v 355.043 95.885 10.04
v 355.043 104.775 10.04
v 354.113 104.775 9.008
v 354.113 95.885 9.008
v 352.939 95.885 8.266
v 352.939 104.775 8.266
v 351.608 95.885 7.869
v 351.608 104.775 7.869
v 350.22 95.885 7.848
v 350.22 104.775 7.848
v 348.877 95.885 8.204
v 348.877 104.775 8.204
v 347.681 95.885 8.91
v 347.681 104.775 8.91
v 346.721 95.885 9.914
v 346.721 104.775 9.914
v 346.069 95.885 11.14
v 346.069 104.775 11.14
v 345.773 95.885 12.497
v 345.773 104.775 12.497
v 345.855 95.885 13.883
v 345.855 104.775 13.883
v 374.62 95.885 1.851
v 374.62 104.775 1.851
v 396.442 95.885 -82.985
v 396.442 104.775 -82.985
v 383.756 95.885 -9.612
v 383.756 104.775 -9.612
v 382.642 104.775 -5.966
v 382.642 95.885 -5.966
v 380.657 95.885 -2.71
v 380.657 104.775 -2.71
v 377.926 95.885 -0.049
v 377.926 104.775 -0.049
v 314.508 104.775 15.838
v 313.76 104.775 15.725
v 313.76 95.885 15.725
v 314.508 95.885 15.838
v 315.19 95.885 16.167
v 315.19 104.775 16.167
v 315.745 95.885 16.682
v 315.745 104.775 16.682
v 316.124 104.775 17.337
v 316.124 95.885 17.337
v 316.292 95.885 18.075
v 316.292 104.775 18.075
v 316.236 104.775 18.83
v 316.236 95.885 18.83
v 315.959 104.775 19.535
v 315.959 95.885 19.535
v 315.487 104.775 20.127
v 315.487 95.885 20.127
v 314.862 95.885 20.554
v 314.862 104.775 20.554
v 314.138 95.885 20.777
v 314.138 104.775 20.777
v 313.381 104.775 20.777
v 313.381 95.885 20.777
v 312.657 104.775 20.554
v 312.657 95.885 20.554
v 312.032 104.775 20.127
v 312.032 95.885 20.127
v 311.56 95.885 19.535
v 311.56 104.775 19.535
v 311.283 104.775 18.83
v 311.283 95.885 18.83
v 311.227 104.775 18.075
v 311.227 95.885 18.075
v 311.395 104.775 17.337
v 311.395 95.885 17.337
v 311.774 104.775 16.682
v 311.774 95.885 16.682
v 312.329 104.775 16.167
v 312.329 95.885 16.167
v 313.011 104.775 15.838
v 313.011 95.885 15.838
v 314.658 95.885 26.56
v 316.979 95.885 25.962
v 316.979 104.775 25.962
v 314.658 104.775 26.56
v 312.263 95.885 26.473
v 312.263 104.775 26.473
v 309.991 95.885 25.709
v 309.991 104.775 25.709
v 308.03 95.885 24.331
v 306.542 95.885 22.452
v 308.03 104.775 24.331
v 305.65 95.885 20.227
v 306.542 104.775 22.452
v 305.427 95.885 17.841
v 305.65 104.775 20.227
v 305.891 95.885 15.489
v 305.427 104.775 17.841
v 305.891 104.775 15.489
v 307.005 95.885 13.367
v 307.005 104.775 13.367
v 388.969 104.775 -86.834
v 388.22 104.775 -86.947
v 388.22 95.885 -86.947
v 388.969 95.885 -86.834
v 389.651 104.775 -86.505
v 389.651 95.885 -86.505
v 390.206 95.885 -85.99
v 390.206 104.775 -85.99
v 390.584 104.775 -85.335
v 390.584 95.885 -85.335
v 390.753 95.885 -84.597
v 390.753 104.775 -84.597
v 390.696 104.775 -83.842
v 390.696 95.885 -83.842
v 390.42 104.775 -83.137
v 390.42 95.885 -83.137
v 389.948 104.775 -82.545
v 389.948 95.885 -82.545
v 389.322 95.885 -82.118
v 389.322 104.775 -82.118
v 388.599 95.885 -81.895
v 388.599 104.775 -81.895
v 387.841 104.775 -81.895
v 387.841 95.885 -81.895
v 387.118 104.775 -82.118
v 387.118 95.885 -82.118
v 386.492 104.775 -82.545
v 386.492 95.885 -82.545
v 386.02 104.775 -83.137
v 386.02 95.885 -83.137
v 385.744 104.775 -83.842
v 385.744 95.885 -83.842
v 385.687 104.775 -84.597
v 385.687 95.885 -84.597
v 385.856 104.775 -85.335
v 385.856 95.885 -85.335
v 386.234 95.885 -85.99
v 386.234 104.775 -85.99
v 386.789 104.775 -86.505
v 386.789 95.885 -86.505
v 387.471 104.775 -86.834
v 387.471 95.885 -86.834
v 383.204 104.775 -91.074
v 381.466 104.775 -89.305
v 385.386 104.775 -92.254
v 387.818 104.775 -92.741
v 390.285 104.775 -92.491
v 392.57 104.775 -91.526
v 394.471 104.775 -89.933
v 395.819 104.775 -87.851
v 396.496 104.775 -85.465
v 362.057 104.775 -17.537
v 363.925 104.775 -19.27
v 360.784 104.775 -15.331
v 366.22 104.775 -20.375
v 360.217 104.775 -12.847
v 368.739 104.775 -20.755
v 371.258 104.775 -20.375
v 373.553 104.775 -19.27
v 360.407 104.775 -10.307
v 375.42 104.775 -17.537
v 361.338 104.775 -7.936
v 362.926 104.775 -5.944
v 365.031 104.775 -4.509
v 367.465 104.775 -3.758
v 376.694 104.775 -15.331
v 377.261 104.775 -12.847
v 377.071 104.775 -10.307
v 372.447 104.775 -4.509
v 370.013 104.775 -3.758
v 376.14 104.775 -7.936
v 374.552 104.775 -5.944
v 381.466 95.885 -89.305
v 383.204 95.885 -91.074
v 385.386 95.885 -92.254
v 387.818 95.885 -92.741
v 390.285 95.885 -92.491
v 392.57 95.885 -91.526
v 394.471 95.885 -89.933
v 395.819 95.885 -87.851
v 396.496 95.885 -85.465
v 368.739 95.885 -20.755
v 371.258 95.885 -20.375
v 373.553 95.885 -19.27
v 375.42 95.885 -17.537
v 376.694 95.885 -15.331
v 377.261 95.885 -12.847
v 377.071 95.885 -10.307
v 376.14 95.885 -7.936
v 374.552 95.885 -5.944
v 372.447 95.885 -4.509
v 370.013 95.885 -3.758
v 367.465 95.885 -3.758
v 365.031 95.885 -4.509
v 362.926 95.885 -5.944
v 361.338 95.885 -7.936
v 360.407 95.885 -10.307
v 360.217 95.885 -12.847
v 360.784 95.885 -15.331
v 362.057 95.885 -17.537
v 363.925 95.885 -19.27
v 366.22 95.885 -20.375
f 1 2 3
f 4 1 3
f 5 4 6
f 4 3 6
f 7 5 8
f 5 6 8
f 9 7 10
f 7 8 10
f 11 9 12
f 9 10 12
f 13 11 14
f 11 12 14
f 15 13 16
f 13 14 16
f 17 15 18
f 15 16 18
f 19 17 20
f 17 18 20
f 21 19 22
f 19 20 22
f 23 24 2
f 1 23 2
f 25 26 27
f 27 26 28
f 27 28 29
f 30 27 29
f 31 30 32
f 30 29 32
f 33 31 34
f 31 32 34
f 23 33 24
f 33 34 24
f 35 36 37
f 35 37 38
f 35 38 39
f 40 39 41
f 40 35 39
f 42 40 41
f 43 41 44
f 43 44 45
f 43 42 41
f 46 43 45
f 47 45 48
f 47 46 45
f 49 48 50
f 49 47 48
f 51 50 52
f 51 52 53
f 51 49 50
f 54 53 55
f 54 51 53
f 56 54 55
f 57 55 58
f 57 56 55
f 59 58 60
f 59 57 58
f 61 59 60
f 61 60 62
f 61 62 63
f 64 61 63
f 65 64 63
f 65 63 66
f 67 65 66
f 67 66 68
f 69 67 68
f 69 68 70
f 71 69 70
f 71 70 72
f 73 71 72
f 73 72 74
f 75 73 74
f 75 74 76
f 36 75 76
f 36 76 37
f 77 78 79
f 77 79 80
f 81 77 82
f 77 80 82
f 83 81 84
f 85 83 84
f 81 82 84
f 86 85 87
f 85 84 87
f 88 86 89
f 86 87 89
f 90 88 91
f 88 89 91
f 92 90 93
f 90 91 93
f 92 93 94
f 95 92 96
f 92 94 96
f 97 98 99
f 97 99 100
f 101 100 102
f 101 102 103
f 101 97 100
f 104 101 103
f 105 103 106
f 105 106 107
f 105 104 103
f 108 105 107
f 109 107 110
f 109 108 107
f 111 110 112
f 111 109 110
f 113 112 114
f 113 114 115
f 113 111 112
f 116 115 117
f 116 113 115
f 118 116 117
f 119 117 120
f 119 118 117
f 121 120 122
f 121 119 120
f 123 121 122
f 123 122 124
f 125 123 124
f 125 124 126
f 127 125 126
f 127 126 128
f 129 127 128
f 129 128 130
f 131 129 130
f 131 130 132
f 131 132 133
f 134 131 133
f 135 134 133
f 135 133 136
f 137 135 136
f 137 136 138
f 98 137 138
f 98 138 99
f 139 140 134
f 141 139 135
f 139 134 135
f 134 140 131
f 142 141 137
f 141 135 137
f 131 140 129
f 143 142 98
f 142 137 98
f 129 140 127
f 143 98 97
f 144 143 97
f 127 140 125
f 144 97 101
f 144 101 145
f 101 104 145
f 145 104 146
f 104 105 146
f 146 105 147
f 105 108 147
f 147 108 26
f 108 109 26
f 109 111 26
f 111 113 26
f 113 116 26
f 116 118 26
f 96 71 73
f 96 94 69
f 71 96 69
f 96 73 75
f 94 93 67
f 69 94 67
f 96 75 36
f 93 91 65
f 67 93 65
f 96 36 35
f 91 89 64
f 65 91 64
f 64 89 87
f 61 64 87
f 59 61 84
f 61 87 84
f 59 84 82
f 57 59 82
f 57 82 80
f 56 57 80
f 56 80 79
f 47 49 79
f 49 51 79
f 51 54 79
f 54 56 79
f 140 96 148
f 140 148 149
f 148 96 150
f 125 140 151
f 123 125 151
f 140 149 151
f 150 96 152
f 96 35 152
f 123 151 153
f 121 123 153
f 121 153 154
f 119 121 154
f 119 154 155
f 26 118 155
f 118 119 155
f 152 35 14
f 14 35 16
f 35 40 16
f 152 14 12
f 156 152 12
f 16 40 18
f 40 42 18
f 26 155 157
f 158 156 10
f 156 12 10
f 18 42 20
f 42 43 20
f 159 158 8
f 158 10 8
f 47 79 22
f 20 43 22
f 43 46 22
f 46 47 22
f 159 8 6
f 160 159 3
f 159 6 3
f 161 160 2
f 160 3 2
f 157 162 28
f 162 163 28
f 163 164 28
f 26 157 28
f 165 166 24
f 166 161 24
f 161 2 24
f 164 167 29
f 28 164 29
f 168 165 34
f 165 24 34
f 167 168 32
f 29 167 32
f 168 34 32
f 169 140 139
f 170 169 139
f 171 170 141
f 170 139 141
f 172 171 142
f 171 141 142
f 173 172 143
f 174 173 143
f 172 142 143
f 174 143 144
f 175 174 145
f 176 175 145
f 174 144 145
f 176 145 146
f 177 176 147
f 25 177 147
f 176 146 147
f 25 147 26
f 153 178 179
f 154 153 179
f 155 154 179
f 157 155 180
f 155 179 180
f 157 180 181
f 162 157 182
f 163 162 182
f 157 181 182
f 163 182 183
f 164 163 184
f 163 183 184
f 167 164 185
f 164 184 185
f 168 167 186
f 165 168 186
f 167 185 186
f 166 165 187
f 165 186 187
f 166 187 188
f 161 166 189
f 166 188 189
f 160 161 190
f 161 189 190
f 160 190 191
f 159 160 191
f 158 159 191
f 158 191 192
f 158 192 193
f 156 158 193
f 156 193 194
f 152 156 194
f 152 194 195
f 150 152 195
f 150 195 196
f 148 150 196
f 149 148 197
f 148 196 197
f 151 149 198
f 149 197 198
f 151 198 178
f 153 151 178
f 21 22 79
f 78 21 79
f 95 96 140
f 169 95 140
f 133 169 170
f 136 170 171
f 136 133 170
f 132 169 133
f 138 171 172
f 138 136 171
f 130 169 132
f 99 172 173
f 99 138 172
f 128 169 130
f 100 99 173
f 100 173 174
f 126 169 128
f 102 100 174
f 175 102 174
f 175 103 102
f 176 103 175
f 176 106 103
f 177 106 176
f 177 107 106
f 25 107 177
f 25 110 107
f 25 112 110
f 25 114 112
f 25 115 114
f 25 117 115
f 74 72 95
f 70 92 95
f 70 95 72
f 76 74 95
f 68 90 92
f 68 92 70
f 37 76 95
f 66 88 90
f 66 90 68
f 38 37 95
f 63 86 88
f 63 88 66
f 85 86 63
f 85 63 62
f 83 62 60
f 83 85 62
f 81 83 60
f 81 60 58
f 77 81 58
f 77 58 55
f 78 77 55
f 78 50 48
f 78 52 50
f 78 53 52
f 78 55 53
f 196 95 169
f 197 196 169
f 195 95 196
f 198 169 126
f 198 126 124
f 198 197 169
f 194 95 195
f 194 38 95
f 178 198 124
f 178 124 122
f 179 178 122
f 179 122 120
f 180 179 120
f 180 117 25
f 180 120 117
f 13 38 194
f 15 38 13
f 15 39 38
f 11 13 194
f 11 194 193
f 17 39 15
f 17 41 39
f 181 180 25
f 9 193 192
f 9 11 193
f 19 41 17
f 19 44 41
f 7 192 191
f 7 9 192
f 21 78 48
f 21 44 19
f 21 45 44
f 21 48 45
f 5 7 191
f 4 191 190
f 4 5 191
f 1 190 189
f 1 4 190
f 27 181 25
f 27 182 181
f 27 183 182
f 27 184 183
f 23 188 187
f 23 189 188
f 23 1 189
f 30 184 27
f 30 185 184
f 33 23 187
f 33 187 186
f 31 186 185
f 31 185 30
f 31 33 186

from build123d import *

# Parameters (mm, degrees)
SKETCH1_W                  = 355.6
SKETCH1_H                  = 77.724
BOSS_EXTRUDE1_DEPTH        = 22.225
SKETCH2_W                  = 74.549
SKETCH2_H                  = 19.05
CUT_EXTRUDE1_DEPTH         = 364.67400769
SKETCH3_W                  = 25.4
SKETCH3_H                  = 3.937
CUT_EXTRUDE2_DEPTH         = 817.444922817
SKETCH4_W                  = 330.2
SKETCH4_H                  = 3.175
BOSS_EXTRUDE2_DEPTH        = 15.875
SKETCH5_W                  = 69.85
SKETCH5_H                  = 3.175
BOSS_EXTRUDE3_DEPTH        = 457.2
SKETCH6_W                  = 330.2
SKETCH6_H                  = 3.175
BOSS_EXTRUDE4_DEPTH        = 3.937
SKETCH7_W                  = 330.2
SKETCH7_H                  = 3.175
BOSS_EXTRUDE5_DEPTH        = 15.875
SKETCH8_W                  = 355.6
SKETCH8_H                  = 3.175
BOSS_EXTRUDE6_DEPTH        = 3.937
SKETCH9_W                  = 355.6
SKETCH9_H                  = 3.175
BOSS_EXTRUDE7_DEPTH        = 19.05
SKETCH10_W                 = 76.358809824
SKETCH10_H                 = 3.175
BOSS_EXTRUDE8_DEPTH        = 27.432
SKETCH11_W                 = 124.052954744
SKETCH11_H                 = 3.175
BOSS_EXTRUDE9_DEPTH        = 19.05
DRAFT1_ANGLE               = 30
DRAFT2_ANGLE               = 19
M20_CLEARANCE_HOLE1_D      = 22.225
M20_CLEARANCE_HOLE1_DEPTH  = 19.050025
HOLE1_D                    = 8.128
HOLE1_DEPTH                = 22.225
M25_CLEARANCE_HOLE1_D      = 28.575
M25_CLEARANCE_HOLE1_DEPTH  = 22.225
M3_CLEARANCE_HOLE1_D       = 3.571875
M3_CLEARANCE_HOLE1_DEPTH   = 22.225
M2_CLEARANCE_HOLE1_D       = 2.54
M2_CLEARANCE_HOLE1_DEPTH   = 22.225
M3_5_CLEARANCE_HOLE1_D     = 4.064
M3_5_CLEARANCE_HOLE1_DEPTH = 22.225
HOLE2_D                    = 5.08
HOLE2_DEPTH                = 22.225
M25_CLEARANCE_HOLE2_D      = 28.575
M25_CLEARANCE_HOLE2_DEPTH  = 19.050025
HOLE3_D                    = 5.1054
HOLE3_DEPTH                = 19.050025
HOLE4_D                    = 8.128
HOLE4_DEPTH                = 19.050025
M3_CLEARANCE_HOLE2_D       = 3.571875
M3_CLEARANCE_HOLE2_DEPTH   = 19.050025
M6_CLEARANCE_HOLE1_D       = 6.7056
M6_CLEARANCE_HOLE1_DEPTH   = 22.225
M6_CLEARANCE_HOLE2_D       = 6.7056
M6_CLEARANCE_HOLE2_DEPTH   = 101.219
M5_CLEARANCE_HOLE1_D       = 5.334
M5_CLEARANCE_HOLE1_DEPTH   = 92.837
CHAMFER1_SIZE              = 3.175
FILLET1_R                  = 0.762
FILLET2_R                  = 3.175
FILLET3_R                  = 3.937
CUT_EXTRUDE3_DEPTH         = 819.902667079
CUT_EXTRUDE3_DEPTH_BACK    = 819.902667079
BOSS_EXTRUDE10_START       = -3.175
SKETCH45_W                 = 177.8
SKETCH45_H                 = 304.8
SKETCH45_R                 = 2.54
SKETCH45_R_2               = 14.2875
SKETCH45_R_3               = 2.032
SKETCH45_R_4               = 3.3528
BOSS_EXTRUDE10_DEPTH       = 3.175
SKETCH61_R                 = 9.652
SKETCH61_R_2               = 14.351
CUT_EXTRUDE16_DEPTH        = 556.389125447
SKETCH59_R                 = 9.5
CUT_EXTRUDE17_DEPTH        = 556.389125447
SKETCH62_R                 = 3.175
CUT_EXTRUDE18_DEPTH        = 556.389125447
CUT_EXTRUDE19_DEPTH        = 556.389125447
SKETCH70_R                 = 9.5
SKETCH70_R_2               = 8.5
BOSS_EXTRUDE15_DEPTH       = 3.175
SKETCH73_R                 = 2.54
CUT_EXTRUDE21_DEPTH        = 556.389125447
FILLET9_R                  = 25.4
BOSS_EXTRUDE17_START       = 101.6
SKETCH74_R                 = 2.54
SKETCH74_R_2               = 14.351
SKETCH74_R_3               = 9.5
SKETCH74_R_4               = 6.35
BOSS_EXTRUDE17_DEPTH       = 3.175
SKETCH75_W                 = 279.499497025
SKETCH75_H                 = 356.937981548
CUT_EXTRUDE22_DEPTH        = 566.17678709
SKETCH93_R                 = 2.54
CUT_EXTRUDE32_DEPTH        = 526.348222626
SKETCH98_R                 = 9.6
SKETCH98_R_2               = 2.54
BOSS_EXTRUDE23_DEPTH       = 8.89
SKETCH99_W                 = 685.374390259
SKETCH99_H                 = 496.181227768
CUT_EXTRUDE37_DEPTH        = 526.413843071
SKETCH100_R                = 9.6
SKETCH100_R_2              = 8.54600018
BOSS_EXTRUDE24_DEPTH       = 8.89


with BuildPart() as part:
    # Sketch1 → Boss-Extrude1 (new body)
    with BuildSketch(Plane(origin=(0, 3.175, 0), x_dir=(1, 0, 0), z_dir=(0, 1, 0))):
        with Locations((635, 34.925)):
            Rectangle(SKETCH1_W, SKETCH1_H)
    extrude(amount=-BOSS_EXTRUDE1_DEPTH)

    # Sketch2 → Cut-Extrude1 (cut, through all)
    with BuildSketch(Plane(origin=(812.8, 0, 0), x_dir=(0, 0, -1), z_dir=(1, 0, 0))):
        with Locations((33.3375, -9.525)):
            Rectangle(SKETCH2_W, SKETCH2_H)
    extrude(amount=-CUT_EXTRUDE1_DEPTH, mode=Mode.SUBTRACT)

    # Sketch3 → Cut-Extrude2 (cut, through all)
    with BuildSketch(Plane(origin=(0, 3.175, 0), x_dir=(-1, 0, 0), z_dir=(0, 1, 0))):
        with Locations((-469.9, 1.9685)):
            Rectangle(SKETCH3_W, SKETCH3_H)
    extrude(amount=-CUT_EXTRUDE2_DEPTH, mode=Mode.SUBTRACT)

    # Sketch4 → Boss-Extrude2 (add)
    with BuildSketch(Plane(origin=(0, 3.175, 0), x_dir=(-1, 0, 0), z_dir=(0, 1, 0))):
        with Locations((-647.7, 2.3495)):
            Rectangle(SKETCH4_W, SKETCH4_H)
    extrude(amount=BOSS_EXTRUDE2_DEPTH)

    # Sketch5 → Boss-Extrude3 (add)
    with BuildSketch(Plane.ZY.offset(-457.2)):
        with Locations((-34.925, 1.5875)):
            Rectangle(SKETCH5_W, SKETCH5_H)
    extrude(amount=BOSS_EXTRUDE3_DEPTH)

    # Sketch6 → Boss-Extrude4 (add)
    with BuildSketch(Plane.XY):
        with Locations((165.1, 1.5875)):
            Rectangle(SKETCH6_W, SKETCH6_H)
    extrude(amount=BOSS_EXTRUDE4_DEPTH)

    # Sketch7 → Boss-Extrude5 (add)
    with BuildSketch(Plane(origin=(0, 3.175, 0), x_dir=(-1, 0, 0), z_dir=(0, 1, 0))):
        with Locations((-165.1, 2.3495)):
            Rectangle(SKETCH7_W, SKETCH7_H)
    extrude(amount=BOSS_EXTRUDE5_DEPTH)

    # Sketch8 → Boss-Extrude6 (add)
    with BuildSketch(Plane(origin=(0, 0, -69.85), x_dir=(-1, 0, 0), z_dir=(0, 0, -1))):
        with Locations((-177.8, 1.5875)):
            Rectangle(SKETCH8_W, SKETCH8_H)
    extrude(amount=BOSS_EXTRUDE6_DEPTH)

    # Sketch9 → Boss-Extrude7 (add)
    with BuildSketch(Plane.XZ):
        with Locations((177.8, -72.1995)):
            Rectangle(SKETCH9_W, SKETCH9_H)
    extrude(amount=BOSS_EXTRUDE7_DEPTH)

    # Sketch10 → Boss-Extrude8 (add)
    with BuildSketch(Plane(origin=(0, 0, -69.85), x_dir=(-1, 0, 0), z_dir=(0, 0, -1))):
        with Locations((-406.4, 1.5875)):
            Rectangle(SKETCH10_W, SKETCH10_H)
    extrude(amount=BOSS_EXTRUDE8_DEPTH)

    # Sketch11 → Boss-Extrude9 (add)
    with BuildSketch(Plane.XY):
        with Locations((406.4, 1.5875)):
            Rectangle(SKETCH11_W, SKETCH11_H)
    extrude(amount=BOSS_EXTRUDE9_DEPTH)

    # Draft1
    draft1_faces = [part.faces().sort_by_distance(p)[0] for p in [
        (344.373522628, 1.5875, 9.525),
        (468.426477372, 1.5875, 9.525),
    ]]
    draft(draft1_faces, Plane.XY.offset(19.05), DRAFT1_ANGLE)

    # Draft2
    draft2_faces = [part.faces().sort_by_distance(p)[0] for p in [
        (368.220595088, 1.5875, -83.566),
        (444.579404912, 1.5875, -83.566),
    ]]
    draft(draft2_faces, Plane(origin=(0, 0, -97.282), x_dir=(-1, 0, 0), z_dir=(0, 0, -1)), DRAFT2_ANGLE)

    # M20 Clearance Hole1
    with Locations(Plane(origin=(0, 0, 0), x_dir=(-1, 0, 0), z_dir=(0, -1, 0))):
        with Locations((-624.254637168, 36.83)):
            Hole(M20_CLEARANCE_HOLE1_D / 2, depth=M20_CLEARANCE_HOLE1_DEPTH)

    # Hole1
    with Locations(Plane(origin=(0, 3.175, 0), x_dir=(1, 0, 0), z_dir=(0, 1, 0))):
        with Locations((229.261562832, 36.83), (229.261562832, 62.23), (229.261562832, 11.43)):
            Hole(HOLE1_D / 2, depth=HOLE1_DEPTH)

    # M25 Clearance Hole1
    with Locations(Plane(origin=(0, 3.175, 0), x_dir=(1, 0, 0), z_dir=(0, 1, 0))):
        with Locations((147.829162832, 36.83)):
            Hole(M25_CLEARANCE_HOLE1_D / 2, depth=M25_CLEARANCE_HOLE1_DEPTH)

    # M3 Clearance Hole1
    with Locations(Plane(origin=(0, 3.175, 0), x_dir=(1, 0, 0), z_dir=(0, 1, 0))):
        with Locations((120.600362832, 65.405), (120.600362832, 8.255), (237.440362832, 8.255), (237.440362832, 65.405)):
            Hole(M3_CLEARANCE_HOLE1_D / 2, depth=M3_CLEARANCE_HOLE1_DEPTH)

    # M2 Clearance Hole1
    with Locations(Plane(origin=(0, 3.175, 0), x_dir=(1, 0, 0), z_dir=(0, 1, 0))):
        with Locations((101.6, 3.175), (101.6, 66.675), (50.8, 66.675), (50.8, 3.175), (762, 66.675), (762, 3.175), (711.2, 3.175), (711.2, 66.675)):
            Hole(M2_CLEARANCE_HOLE1_D / 2, depth=M2_CLEARANCE_HOLE1_DEPTH)

    # M3.5 Clearance Hole1
    with Locations(Plane(origin=(0, 3.175, 0), x_dir=(1, 0, 0), z_dir=(0, 1, 0))):
        with Locations((443.992, 87.85352), (368.808, 87.85352), (361.9119, -1.03886), (450.8881, -1.03886)):
            Hole(M3_5_CLEARANCE_HOLE1_D / 2, depth=M3_5_CLEARANCE_HOLE1_DEPTH)

    # Hole2
    with Locations(Plane(origin=(0, 3.175, 0), x_dir=(1, 0, 0), z_dir=(0, 1, 0))):
        with Locations((438.15, 87.85352), (374.65, 87.85352), (445.0461, -1.03886), (367.7539, -1.03886), (115.520362832, 65.405), (115.520362832, 8.255), (242.520362832, 8.255), (242.520362832, 65.405)):
            Hole(HOLE2_D / 2, depth=HOLE2_DEPTH)

    # M25 Clearance Hole2
    with Locations(Plane(origin=(0, 0, 0), x_dir=(-1, 0, 0), z_dir=(0, -1, 0))):
        with Locations((-406.4, 17.272), (-664.970837168, 36.83)):
            Hole(M25_CLEARANCE_HOLE2_D / 2, depth=M25_CLEARANCE_HOLE2_DEPTH)

    # Hole3
    with Locations(Plane(origin=(0, 0, 0), x_dir=(-1, 0, 0), z_dir=(0, -1, 0))):
        with Locations((-570.279637168, 8.255), (-570.279637168, 65.405), (-697.279637168, 65.405), (-697.279637168, 8.255)):
            Hole(HOLE3_D / 2, depth=HOLE3_DEPTH)

    # Hole4
    with Locations(Plane(origin=(0, 0, 0), x_dir=(-1, 0, 0), z_dir=(0, -1, 0))):
        with Locations((-583.538437168, 11.43), (-583.538437168, 36.83), (-583.538437168, 62.23)):
            Hole(HOLE4_D / 2, depth=HOLE4_DEPTH)

    # M3 Clearance Hole2
    with Locations(Plane(origin=(0, 0, 0), x_dir=(-1, 0, 0), z_dir=(0, -1, 0))):
        with Locations((-692.199637168, 8.255), (-692.199637168, 65.405), (-575.359637168, 65.405), (-575.359637168, 8.255)):
            Hole(M3_CLEARANCE_HOLE2_D / 2, depth=M3_CLEARANCE_HOLE2_DEPTH)

    # M6 Clearance Hole1
    with Locations(Plane(origin=(0, 3.175, 0), x_dir=(1, 0, 0), z_dir=(0, 1, 0))):
        with Locations((612.775, 10.287), (498.475, 10.287), (314.325, 10.287), (200.025, 10.287), (628.319218584, 61.976), (184.480781416, 61.976), (690.88, 15.875), (739.902, 9.525), (121.92, 15.875), (72.898, 9.525), (298.874532383, 17.547282407), (513.925467617, 17.547282407), (165.1, 14.732), (266.7, 14.732), (546.1, 14.732), (647.7, 14.732), (330.2, 61.722), (279.4, 61.722), (139.7, 61.722), (25.4, 61.722), (482.6, 61.722), (533.4, 61.722), (673.1, 61.722), (787.4, 61.722), (6.35, 39.497), (806.45, 39.497), (350.8375, -12.8905), (461.9625, -12.8905)):
            Hole(M6_CLEARANCE_HOLE1_D / 2, depth=M6_CLEARANCE_HOLE1_DEPTH)

    # M6 Clearance Hole2
    with Locations(Plane.XY.offset(3.937)):
        with Locations((495.3, 12.7), (520.7, 12.7), (546.1, 12.7), (571.5, 12.7), (596.9, 12.7), (622.3, 12.7), (647.7, 12.7), (673.1, 12.7), (698.5, 12.7), (723.9, 12.7), (749.3, 12.7), (774.7, 12.7), (800.1, 12.7), (317.5, 12.7), (292.1, 12.7), (266.7, 12.7), (241.3, 12.7), (215.9, 12.7), (190.5, 12.7), (165.1, 12.7), (139.7, 12.7), (114.3, 12.7), (88.9, 12.7), (63.5, 12.7), (12.7, 12.7), (38.1, 12.7)):
            Hole(M6_CLEARANCE_HOLE2_D / 2, depth=M6_CLEARANCE_HOLE2_DEPTH)

    # M5 Clearance Hole1
    with Locations(Plane(origin=(0, 0, -73.787), x_dir=(-1, 0, 0), z_dir=(0, 0, -1))):
        with Locations((-469.9, -12.7), (-495.3, -12.7), (-520.7, -12.7), (-546.1, -12.7), (-571.5, -12.7), (-596.9, -12.7), (-622.3, -12.7), (-647.7, -12.7), (-673.1, -12.7), (-698.5, -12.7), (-723.9, -12.7), (-749.3, -12.7), (-774.7, -12.7), (-800.1, -12.7), (-342.9, -12.7), (-317.5, -12.7), (-292.1, -12.7), (-266.7, -12.7), (-241.3, -12.7), (-215.9, -12.7), (-190.5, -12.7), (-165.1, -12.7), (-139.7, -12.7), (-114.3, -12.7), (-88.9, -12.7), (-63.5, -12.7), (-38.1, -12.7), (-12.7, -12.7)):
            Hole(M5_CLEARANCE_HOLE1_D / 2, depth=M5_CLEARANCE_HOLE1_DEPTH)

    # Chamfer1
    chamfer1_edges = [part.edges().sort_by_distance(p)[0] for p in [
        (482.6, 19.05, 2.3495),
        (0, 19.05, 2.3495),
        (812.8, 19.05, 2.3495),
        (812.8, -19.05, -72.1995),
        (457.2, -19.05, -72.1995),
        (0, -19.05, -72.1995),
        (330.2, 19.05, 2.3495),
        (355.6, -19.05, -72.1995),
    ]]
    chamfer(chamfer1_edges, length=CHAMFER1_SIZE)

    # Fillet1
    fillet1_edges = [part.edges().sort_by_distance(p)[0] for p in [
        (647.7, 3.175, 0.762),
        (177.8, 0, -70.612),
        (635, 0, -70.612),
        (165.1, 3.175, 0.762),
    ]]
    fillet(fillet1_edges, radius=FILLET1_R)

    # Fillet2
    fillet2_edges = [part.edges().sort_by_distance(p)[0] for p in [
        (368.220595088, 1.5875, -97.282),
        (333.375, 1.5875, 0),
        (344.373522628, 1.5875, 19.05),
        (444.579404912, 1.5875, -97.282),
        (358.775, 1.5875, -69.85),
        (479.425, 1.5875, 0),
        (468.426477372, 1.5875, 19.05),
        (454.025, 1.5875, -69.85),
    ]]
    fillet(fillet2_edges, radius=FILLET2_R)

    # Fillet3
    fillet3_edges = [part.edges().sort_by_distance(p)[0] for p in [
        (165.1, 0, 3.937),
        (647.7, 0, 3.937),
        (635, 3.175, -73.787),
        (177.8, 3.175, -73.787),
    ]]
    fillet(fillet3_edges, radius=FILLET3_R)

    # Sketch44 → Cut-Extrude3 (cut, two sides: drawn at the far end of the back side and taken through both)
    with BuildSketch(Plane(origin=(0, 3.175, 0), x_dir=(1, 0, 0), z_dir=(0, 1, 0)).offset(-CUT_EXTRUDE3_DEPTH_BACK)):
        Polygon((367.483279101, 95.14067889), (343.456979076, -17.4625), (339.564298226, -35.70618453), (-19.786749283, -35.70618453), (-19.786749283, 120.609234526), (367.483279101, 120.609234526), align=None)
        Polygon((445.316720899, 95.14067889), (445.316720899, 120.609234526), (832.586749283, 120.609234526), (832.586749283, -35.70618453), (473.235701774, -35.70618453), (469.343020924, -17.4625), align=None)
    extrude(amount=CUT_EXTRUDE3_DEPTH + CUT_EXTRUDE3_DEPTH_BACK, mode=Mode.SUBTRACT)

    # Sketch45 → Boss-Extrude10 (add)
    with BuildSketch(Plane(origin=(0, 3.175, 0), x_dir=(1, 0, 0), z_dir=(0, 1, 0)).offset(BOSS_EXTRUDE10_START)):
        with Locations((392.1125, 125.222)):
            Rectangle(SKETCH45_W, SKETCH45_H)
        with Locations(Location((374.65, 87.85352, 0), (0, 0, 270))):
            Circle(SKETCH45_R, mode=Mode.SUBTRACT)
        with Locations(Location((406.4, 17.272, 0), (0, 0, 90))):
            Circle(SKETCH45_R_2, mode=Mode.SUBTRACT)
        with Locations(Location((368.808, 87.85352, 0), (0, 0, 270))):
            Circle(SKETCH45_R_3, mode=Mode.SUBTRACT)
        with Locations(Location((438.15, 87.85352, 0), (0, 0, 270))):
            Circle(SKETCH45_R, mode=Mode.SUBTRACT)
        with Locations(Location((443.992, 87.85352, 0), (0, 0, 270))):
            Circle(SKETCH45_R_3, mode=Mode.SUBTRACT)
        with Locations(Location((445.0461, -1.03886, 0), (0, 0, 270))):
            Circle(SKETCH45_R, mode=Mode.SUBTRACT)
        with Locations(Location((450.8881, -1.03886, 0), (0, 0, 270))):
            Circle(SKETCH45_R_3, mode=Mode.SUBTRACT)
        with Locations(Location((461.9625, -12.8905, 0), (0, 0, 270))):
            Circle(SKETCH45_R_4, mode=Mode.SUBTRACT)
        with Locations(Location((367.7539, -1.03886, 0), (0, 0, 270))):
            Circle(SKETCH45_R, mode=Mode.SUBTRACT)
        with Locations(Location((361.9119, -1.03886, 0), (0, 0, 270))):
            Circle(SKETCH45_R_3, mode=Mode.SUBTRACT)
        with Locations(Location((350.8375, -12.8905, 0), (0, 0, 270))):
            Circle(SKETCH45_R_4, mode=Mode.SUBTRACT)
    extrude(amount=BOSS_EXTRUDE10_DEPTH)

    # Sketch61 → Cut-Extrude16 (cut, through all)
    with BuildSketch(Plane(origin=(0, 3.175, 0), x_dir=(1, 0, 0), z_dir=(0, 1, 0))):
        with Locations(Location((354.59, 181.205026561, 0), (0, 0, 270))):
            Circle(SKETCH61_R)
        with Locations(Location((427.755496639, 227.083776561, 0), (0, 0, 270))):
            Circle(SKETCH61_R)
        with Locations(Location((427.755496639, 145.803776561, 0), (0, 0, 270))):
            Circle(SKETCH61_R_2)
    extrude(amount=-CUT_EXTRUDE16_DEPTH, mode=Mode.SUBTRACT)

    # Sketch59 → Cut-Extrude17 (cut, through all)
    with BuildSketch(Plane(origin=(0, 3.175, 0), x_dir=(1, 0, 0), z_dir=(0, 1, 0))):
        with Locations(Location((348.684503149, 23.009719341, 0), (0, 0, 270))):
            Circle(SKETCH59_R)
    extrude(amount=-CUT_EXTRUDE17_DEPTH, mode=Mode.SUBTRACT)

    # Sketch62 → Cut-Extrude18 (cut, through all)
    with BuildSketch(Plane(origin=(0, 3.175, 0), x_dir=(1, 0, 0), z_dir=(0, 1, 0))):
        with Locations(Location((354.59, 206.605026561, 0), (0, 0, 270))):
            Circle(SKETCH62_R)
        with Locations(Location((354.59, 155.805026561, 0), (0, 0, 270))):
            Circle(SKETCH62_R)
        with Locations(Location((402.355496639, 227.083776561, 0), (0, 0, 270))):
            Circle(SKETCH62_R)
        with Locations(Location((453.155496639, 227.083776561, 0), (0, 0, 270))):
            Circle(SKETCH62_R)
    extrude(amount=-CUT_EXTRUDE18_DEPTH, mode=Mode.SUBTRACT)

    # Sketch64 → Cut-Extrude19 (cut, through all)
    with BuildSketch(Plane(origin=(0, 3.175, 0), x_dir=(1, 0, 0), z_dir=(0, 1, 0))):
        with BuildLine():
            Line((303.2125, 150.622), (303.2125, 277.622))
            Line((303.2125, 277.622), (430.2125, 277.622))
            ThreePointArc((430.2125, 277.622), (340.409938789, 240.424561211), (303.2125, 150.622))
        make_face()
    extrude(amount=-CUT_EXTRUDE19_DEPTH, mode=Mode.SUBTRACT)

    # Sketch70 → Boss-Extrude15 (add)
    with BuildSketch(Plane(origin=(0, 3.175, 0), x_dir=(1, 0, 0), z_dir=(0, 1, 0))):
        with Locations((348.684503149, 23.009719341)):
            Circle(SKETCH70_R)
        with Locations(Location((348.684503149, 23.009719341, 0), (0, 0, 270))):
            Circle(SKETCH70_R_2, mode=Mode.SUBTRACT)
    extrude(amount=-BOSS_EXTRUDE15_DEPTH)

    # Sketch73 → Cut-Extrude21 (cut, through all)
    with BuildSketch(Plane(origin=(0, 3.175, 0), x_dir=(1, 0, 0), z_dir=(0, 1, 0))):
        with Locations(Location((453.155496639, 69.943578721, 0), (0, 0, 270))):
            Circle(SKETCH73_R)
        with Locations(Location((461.9625, 190.253776561, 0), (0, 0, 270))):
            Circle(SKETCH73_R)
        with Locations(Location((345.205496639, 120.403776561, 0), (0, 0, 270))):
            Circle(SKETCH73_R)
        with Locations(Location((388.219999894, 84.406747951, 0), (0, 0, 270))):
            Circle(SKETCH73_R)
        with Locations(Location((313.759503149, -18.265280659, 0), (0, 0, 270))):
            Circle(SKETCH73_R)
    extrude(amount=-CUT_EXTRUDE21_DEPTH, mode=Mode.SUBTRACT)

    # Fillet9
    fillet9_edges = [part.edges().sort_by_distance(p)[0] for p in [
        (481.0125, 1.5875, 27.178),
        (481.0125, 1.5875, -277.622),
    ]]
    fillet(fillet9_edges, radius=FILLET9_R)

    # Sketch75 → Cut-Extrude22 (cut, through all)
    with BuildSketch(Plane(origin=(0, 3.175, 0), x_dir=(1, 0, 0), z_dir=(0, 1, 0))):
        with Locations((372.338031056, 109.356950247)):
            Rectangle(SKETCH75_W, SKETCH75_H)
    extrude(amount=-CUT_EXTRUDE22_DEPTH, mode=Mode.SUBTRACT)


with BuildPart() as body_2:
    # Sketch74 → Boss-Extrude17 (new body)
    with BuildSketch(Plane(origin=(0, 3.175, 0), x_dir=(1, 0, 0), z_dir=(0, 1, 0)).offset(BOSS_EXTRUDE17_START)):
        with BuildLine():
            Line((303.501804087, -11.782702808), (332.794800726, 123.099073753))
            ThreePointArc((332.794800726, 123.099073753), (334.793445529, 127.675584568), (338.402025721, 131.127711635))
            Line((338.402025721, 131.127711635), (461.509029081, 209.229165205))
            ThreePointArc((461.509029081, 209.229165205), (475.073661576, 209.255890303), (480.92514682, 197.018239818))
            Line((480.92514682, 197.018239818), (465.768143459, 68.456588408))
            ThreePointArc((465.768143459, 68.456588408), (463.858984359, 63.107984333), (459.809495756, 59.126264093))
            Line((459.809495756, 59.126264093), (322.566499117, -25.295314628))
            ThreePointArc((322.566499117, -25.295314628), (308.568620981, -24.839343588), (303.501804087, -11.782702808))
        make_face()
        with Locations(Location((453.155496639, 69.943578721, 0), (0, 0, 270))):
            Circle(SKETCH74_R, mode=Mode.SUBTRACT)
        with Locations(Location((461.9625, 190.253776561, 0), (0, 0, 270))):
            Circle(SKETCH74_R, mode=Mode.SUBTRACT)
        with Locations(Location((345.205496639, 120.403776561, 0), (0, 0, 270))):
            Circle(SKETCH74_R, mode=Mode.SUBTRACT)
        with Locations(Location((388.219999894, 84.406747951, 0), (0, 0, 270))):
            Circle(SKETCH74_R, mode=Mode.SUBTRACT)
        with Locations(Location((313.759503149, -18.265280659, 0), (0, 0, 270))):
            Circle(SKETCH74_R, mode=Mode.SUBTRACT)
        with Locations(Location((427.755496639, 145.803776561, 0), (0, 0, 270))):
            Circle(SKETCH74_R_2, mode=Mode.SUBTRACT)
        with Locations(Location((348.684503149, 23.009719341, 0), (0, 0, 270))):
            Circle(SKETCH74_R_3, mode=Mode.SUBTRACT)
        with Locations(Location((420.687748267, 77.175163336, 0), (0, 0, 270))):
            Circle(SKETCH74_R_4, mode=Mode.SUBTRACT)
        with Locations(Location((371.729, 87.85352, 0), (0, 0, 270))):
            Circle(SKETCH74_R_4, mode=Mode.SUBTRACT)
        with Locations(Location((441.071, 87.85352, 0), (0, 0, 270))):
            Circle(SKETCH74_R_4, mode=Mode.SUBTRACT)
    extrude(amount=BOSS_EXTRUDE17_DEPTH)

    # Sketch93 → Cut-Extrude32 (cut, through all)
    with BuildSketch(Plane(origin=(0, 107.95, 0), x_dir=(1, 0, 0), z_dir=(0, 1, 0))):
        with Locations(Location((335.984503149, 61.109719341, 0), (0, 0, 270))):
            Circle(SKETCH93_R)
        with Locations(Location((361.384503149, 61.109719341, 0), (0, 0, 270))):
            Circle(SKETCH93_R)
    extrude(amount=-CUT_EXTRUDE32_DEPTH, mode=Mode.SUBTRACT)

    # Sketch98 → Boss-Extrude23 (add)
    with BuildSketch(Plane.XZ.offset(-104.775)):
        with BuildLine():
            Line((345.855456024, 13.883292938), (316.979331854, 25.962493289))
            ThreePointArc((316.979331854, 25.962493289), (307.218453945, 23.444957721), (307.005227372, 13.366899509))
            Line((307.005227372, 13.366899509), (381.465724117, -89.305129101))
            ThreePointArc((381.465724117, -89.305129101), (391.463952816, -92.093824678), (396.441551668, -82.985317126))
            Line((396.441551668, -82.985317126), (383.756046671, -9.612392997))
            ThreePointArc((383.756046671, -9.612392997), (380.656766474, -2.710282486), (374.620066838, 1.85073985))
            Line((374.620066838, 1.85073985), (355.042542418, 10.04023365))
            ThreePointArc((355.042542418, 10.04023365), (348.877089577, 8.204009738), (345.855456024, 13.883292938))
        make_face()
        with Locations(Location((368.738835568, -12.208730934, 0), (0, 0, 94.54136383))):
            Circle(SKETCH98_R, mode=Mode.SUBTRACT)
        with Locations(Location((313.759503149, 18.265280659, 0), (0, 0, 270))):
            Circle(SKETCH98_R_2, mode=Mode.SUBTRACT)
        with Locations(Location((388.219999894, -84.406747951, 0), (0, 0, 270))):
            Circle(SKETCH98_R_2, mode=Mode.SUBTRACT)
    extrude(amount=BOSS_EXTRUDE23_DEPTH)

    # Sketch99 → Cut-Extrude37 (cut, through all)
    with BuildSketch(Plane.XZ.offset(-104.775)):
        with Locations((276.11072449, -84.64354836)):
            Rectangle(SKETCH99_W, SKETCH99_H)
    extrude(amount=-CUT_EXTRUDE37_DEPTH, mode=Mode.SUBTRACT)

    # Sketch100 → Boss-Extrude24 (add, through all)
    with BuildSketch(Plane.XZ.offset(-95.885)):
        with Locations((368.738835568, -12.208730934)):
            Circle(SKETCH100_R)
        with Locations(Location((368.738835568, -12.208730934, 0), (0, 0, 270))):
            Circle(SKETCH100_R_2, mode=Mode.SUBTRACT)
    extrude(amount=-BOSS_EXTRUDE24_DEPTH)


solid = body_2.part
